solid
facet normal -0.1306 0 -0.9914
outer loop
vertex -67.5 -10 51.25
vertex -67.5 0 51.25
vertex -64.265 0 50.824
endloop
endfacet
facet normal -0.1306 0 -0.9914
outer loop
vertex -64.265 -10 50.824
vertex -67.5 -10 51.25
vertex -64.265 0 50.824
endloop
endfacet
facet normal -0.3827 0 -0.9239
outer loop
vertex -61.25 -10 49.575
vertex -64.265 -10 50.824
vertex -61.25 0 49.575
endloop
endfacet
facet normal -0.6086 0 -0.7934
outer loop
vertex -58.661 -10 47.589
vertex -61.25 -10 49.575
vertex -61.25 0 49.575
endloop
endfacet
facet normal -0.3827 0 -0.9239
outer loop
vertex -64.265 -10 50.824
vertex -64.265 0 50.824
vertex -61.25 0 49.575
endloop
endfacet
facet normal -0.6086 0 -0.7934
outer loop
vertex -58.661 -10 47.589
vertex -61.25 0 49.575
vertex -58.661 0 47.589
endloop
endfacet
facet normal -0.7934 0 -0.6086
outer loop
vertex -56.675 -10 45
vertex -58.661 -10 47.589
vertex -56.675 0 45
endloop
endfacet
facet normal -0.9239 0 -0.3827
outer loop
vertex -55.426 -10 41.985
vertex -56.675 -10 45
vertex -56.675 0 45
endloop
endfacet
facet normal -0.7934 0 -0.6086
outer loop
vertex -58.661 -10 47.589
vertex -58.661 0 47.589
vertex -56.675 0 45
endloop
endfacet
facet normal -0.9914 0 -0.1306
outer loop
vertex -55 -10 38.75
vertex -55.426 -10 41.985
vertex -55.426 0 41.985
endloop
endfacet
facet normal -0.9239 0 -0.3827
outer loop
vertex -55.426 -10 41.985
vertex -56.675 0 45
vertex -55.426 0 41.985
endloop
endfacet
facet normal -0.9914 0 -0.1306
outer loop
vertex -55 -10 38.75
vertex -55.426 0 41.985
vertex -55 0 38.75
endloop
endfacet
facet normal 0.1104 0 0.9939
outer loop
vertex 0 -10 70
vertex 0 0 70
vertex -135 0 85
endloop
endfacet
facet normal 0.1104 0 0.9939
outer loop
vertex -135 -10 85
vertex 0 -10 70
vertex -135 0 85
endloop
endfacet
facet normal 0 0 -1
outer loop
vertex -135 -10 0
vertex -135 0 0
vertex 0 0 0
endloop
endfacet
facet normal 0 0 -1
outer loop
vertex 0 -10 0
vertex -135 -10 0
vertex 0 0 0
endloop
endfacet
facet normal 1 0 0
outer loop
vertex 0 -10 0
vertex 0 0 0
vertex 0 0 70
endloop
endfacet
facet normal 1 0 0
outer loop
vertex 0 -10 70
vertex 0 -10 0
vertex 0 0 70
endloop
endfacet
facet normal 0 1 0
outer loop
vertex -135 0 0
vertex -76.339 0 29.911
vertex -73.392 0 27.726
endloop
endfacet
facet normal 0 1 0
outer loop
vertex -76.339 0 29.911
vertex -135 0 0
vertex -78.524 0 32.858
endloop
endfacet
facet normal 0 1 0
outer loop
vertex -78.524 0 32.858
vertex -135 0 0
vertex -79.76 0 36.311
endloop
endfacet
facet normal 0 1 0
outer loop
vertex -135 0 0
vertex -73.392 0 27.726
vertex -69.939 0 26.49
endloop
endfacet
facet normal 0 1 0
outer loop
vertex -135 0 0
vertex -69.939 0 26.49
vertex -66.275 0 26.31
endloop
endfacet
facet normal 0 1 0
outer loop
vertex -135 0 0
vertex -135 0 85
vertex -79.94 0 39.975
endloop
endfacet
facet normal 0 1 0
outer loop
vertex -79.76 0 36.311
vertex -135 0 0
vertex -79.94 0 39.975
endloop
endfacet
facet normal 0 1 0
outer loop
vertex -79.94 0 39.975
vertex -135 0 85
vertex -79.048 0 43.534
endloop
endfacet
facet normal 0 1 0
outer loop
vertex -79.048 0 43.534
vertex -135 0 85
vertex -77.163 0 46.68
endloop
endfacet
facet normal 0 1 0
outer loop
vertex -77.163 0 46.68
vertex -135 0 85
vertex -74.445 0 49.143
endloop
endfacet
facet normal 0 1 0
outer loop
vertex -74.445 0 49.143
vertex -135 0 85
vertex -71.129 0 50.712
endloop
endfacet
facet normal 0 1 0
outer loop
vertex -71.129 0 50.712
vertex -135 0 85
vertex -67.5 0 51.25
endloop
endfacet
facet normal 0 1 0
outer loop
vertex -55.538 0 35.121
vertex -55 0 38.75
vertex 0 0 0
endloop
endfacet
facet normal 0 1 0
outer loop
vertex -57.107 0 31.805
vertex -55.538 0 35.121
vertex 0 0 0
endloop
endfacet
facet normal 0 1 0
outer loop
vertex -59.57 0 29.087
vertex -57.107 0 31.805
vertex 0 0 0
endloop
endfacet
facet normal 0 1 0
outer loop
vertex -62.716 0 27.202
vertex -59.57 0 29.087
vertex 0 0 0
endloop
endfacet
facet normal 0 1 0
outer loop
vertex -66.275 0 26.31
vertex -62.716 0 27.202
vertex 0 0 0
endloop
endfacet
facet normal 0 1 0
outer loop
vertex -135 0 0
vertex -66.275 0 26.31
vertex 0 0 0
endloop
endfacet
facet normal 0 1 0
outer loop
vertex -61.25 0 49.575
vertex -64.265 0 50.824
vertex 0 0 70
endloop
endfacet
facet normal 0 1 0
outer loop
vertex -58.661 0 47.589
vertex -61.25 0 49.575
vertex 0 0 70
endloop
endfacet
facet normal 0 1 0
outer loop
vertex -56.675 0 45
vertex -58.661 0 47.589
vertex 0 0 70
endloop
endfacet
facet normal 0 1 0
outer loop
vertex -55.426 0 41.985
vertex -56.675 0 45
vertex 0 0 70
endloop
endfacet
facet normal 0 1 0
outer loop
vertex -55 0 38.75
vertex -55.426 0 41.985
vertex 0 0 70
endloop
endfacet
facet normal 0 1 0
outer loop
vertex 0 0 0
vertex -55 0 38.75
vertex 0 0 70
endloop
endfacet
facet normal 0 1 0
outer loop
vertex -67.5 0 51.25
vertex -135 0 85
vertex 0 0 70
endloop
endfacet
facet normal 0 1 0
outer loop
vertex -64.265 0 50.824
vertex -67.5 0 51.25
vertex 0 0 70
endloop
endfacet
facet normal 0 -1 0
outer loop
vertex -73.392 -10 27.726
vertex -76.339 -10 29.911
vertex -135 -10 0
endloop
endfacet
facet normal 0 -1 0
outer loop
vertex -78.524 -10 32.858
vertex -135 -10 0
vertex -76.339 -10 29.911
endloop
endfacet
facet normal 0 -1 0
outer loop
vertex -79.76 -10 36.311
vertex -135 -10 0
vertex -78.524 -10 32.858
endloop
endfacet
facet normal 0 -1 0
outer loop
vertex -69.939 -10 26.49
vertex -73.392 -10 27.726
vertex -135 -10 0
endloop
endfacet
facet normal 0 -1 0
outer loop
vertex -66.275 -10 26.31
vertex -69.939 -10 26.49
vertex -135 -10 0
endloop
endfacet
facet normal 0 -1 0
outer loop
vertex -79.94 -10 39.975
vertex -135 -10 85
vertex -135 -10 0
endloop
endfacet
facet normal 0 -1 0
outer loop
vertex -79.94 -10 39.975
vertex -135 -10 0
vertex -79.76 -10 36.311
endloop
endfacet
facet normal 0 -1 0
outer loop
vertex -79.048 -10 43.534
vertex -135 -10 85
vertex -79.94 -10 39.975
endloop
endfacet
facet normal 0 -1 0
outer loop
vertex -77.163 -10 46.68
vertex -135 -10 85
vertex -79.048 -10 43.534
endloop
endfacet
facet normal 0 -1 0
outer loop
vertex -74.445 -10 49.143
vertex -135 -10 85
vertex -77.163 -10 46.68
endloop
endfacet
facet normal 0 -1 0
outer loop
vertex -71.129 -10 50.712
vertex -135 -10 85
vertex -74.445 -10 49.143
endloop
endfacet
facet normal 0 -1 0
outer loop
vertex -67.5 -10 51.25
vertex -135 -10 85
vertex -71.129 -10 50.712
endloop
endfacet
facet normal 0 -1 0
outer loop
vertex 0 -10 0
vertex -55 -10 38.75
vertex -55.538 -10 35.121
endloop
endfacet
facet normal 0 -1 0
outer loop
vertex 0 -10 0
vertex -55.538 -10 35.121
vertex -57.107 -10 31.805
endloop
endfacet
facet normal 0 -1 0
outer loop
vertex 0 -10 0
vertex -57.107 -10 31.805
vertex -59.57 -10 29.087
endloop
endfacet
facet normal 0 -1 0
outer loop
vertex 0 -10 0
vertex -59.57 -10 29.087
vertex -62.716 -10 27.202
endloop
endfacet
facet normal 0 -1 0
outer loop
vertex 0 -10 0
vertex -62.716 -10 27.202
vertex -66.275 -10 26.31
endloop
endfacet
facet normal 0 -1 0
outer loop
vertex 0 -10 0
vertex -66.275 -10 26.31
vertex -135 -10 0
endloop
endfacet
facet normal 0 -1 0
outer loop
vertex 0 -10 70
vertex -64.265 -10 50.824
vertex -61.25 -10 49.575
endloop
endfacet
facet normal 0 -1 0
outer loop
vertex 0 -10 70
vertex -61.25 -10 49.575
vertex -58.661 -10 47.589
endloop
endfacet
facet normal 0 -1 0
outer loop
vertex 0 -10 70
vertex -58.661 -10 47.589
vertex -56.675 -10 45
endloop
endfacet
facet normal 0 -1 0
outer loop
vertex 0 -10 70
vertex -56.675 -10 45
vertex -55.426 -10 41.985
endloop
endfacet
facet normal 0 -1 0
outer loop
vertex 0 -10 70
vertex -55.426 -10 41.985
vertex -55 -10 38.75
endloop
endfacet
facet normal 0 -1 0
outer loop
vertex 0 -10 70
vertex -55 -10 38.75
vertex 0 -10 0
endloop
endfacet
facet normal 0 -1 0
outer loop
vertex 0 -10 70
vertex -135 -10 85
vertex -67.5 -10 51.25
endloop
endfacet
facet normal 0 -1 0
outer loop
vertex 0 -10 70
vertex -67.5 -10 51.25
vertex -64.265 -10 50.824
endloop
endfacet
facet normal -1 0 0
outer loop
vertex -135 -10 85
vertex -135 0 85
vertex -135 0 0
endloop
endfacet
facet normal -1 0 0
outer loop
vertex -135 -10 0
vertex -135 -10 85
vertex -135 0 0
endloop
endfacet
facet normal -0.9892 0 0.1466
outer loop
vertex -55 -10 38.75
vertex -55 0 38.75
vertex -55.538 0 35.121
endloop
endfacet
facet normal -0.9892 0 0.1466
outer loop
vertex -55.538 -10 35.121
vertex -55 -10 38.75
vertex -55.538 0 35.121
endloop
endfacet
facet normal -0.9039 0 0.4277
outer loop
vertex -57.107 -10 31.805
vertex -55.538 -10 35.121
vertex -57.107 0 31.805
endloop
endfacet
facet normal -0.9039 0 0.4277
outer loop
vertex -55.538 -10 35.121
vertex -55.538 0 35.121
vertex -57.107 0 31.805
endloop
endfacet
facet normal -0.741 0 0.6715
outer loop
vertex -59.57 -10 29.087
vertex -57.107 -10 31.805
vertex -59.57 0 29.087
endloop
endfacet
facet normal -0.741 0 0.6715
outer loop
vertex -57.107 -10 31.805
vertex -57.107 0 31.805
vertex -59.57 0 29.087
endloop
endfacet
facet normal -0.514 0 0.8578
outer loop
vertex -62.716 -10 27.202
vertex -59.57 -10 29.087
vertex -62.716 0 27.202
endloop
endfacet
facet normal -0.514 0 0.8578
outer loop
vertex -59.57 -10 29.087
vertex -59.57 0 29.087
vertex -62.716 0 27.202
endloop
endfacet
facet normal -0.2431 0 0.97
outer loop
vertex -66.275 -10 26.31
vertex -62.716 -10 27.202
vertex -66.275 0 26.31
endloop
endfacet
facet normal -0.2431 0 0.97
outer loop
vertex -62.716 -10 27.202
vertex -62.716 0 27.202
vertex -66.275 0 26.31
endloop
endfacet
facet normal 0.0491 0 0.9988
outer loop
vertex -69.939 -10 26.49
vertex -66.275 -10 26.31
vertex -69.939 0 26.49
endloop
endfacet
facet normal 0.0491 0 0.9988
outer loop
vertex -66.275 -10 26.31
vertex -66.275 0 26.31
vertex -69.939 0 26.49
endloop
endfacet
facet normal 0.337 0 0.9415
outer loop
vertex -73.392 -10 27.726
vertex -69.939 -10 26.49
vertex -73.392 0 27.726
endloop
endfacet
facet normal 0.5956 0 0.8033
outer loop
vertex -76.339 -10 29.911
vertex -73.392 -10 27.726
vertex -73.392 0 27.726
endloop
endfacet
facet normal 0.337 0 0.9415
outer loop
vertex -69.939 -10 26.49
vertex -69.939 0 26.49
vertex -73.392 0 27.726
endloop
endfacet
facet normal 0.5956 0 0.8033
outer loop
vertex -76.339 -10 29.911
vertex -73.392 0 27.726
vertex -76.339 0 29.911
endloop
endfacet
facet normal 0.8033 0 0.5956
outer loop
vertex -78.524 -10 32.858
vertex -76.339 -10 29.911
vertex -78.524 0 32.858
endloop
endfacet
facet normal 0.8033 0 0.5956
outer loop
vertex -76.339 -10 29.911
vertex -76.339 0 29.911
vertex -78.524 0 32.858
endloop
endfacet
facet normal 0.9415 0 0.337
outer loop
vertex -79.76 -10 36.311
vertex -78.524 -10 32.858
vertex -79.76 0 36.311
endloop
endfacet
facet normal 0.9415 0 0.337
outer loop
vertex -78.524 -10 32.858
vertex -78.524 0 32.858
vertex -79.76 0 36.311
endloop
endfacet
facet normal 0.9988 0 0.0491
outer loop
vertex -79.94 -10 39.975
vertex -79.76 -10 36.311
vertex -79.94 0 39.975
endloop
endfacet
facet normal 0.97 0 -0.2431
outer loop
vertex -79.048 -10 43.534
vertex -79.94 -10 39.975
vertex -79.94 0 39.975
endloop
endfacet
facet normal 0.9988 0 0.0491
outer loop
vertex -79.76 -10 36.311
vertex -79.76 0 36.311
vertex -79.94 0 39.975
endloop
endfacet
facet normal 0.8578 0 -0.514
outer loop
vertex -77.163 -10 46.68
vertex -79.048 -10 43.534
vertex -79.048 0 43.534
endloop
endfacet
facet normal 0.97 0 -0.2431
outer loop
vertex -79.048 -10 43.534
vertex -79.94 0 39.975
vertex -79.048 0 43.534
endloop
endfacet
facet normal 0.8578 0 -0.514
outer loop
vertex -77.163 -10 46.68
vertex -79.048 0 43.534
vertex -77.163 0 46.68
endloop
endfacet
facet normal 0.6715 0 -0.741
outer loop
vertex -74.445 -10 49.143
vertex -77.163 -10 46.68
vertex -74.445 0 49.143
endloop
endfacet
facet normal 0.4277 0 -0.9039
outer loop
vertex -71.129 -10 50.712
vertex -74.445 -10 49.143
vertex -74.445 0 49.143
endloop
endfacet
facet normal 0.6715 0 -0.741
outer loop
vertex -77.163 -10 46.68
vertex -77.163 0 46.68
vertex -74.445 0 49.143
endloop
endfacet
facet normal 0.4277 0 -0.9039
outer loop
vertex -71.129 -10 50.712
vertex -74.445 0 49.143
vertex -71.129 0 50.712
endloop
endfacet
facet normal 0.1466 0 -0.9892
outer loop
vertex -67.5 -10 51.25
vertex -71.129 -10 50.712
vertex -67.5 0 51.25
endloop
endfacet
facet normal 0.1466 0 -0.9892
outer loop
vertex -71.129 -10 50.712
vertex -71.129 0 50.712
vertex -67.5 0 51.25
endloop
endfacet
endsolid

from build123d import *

# Parameters (mm, degrees)
F1_DEPTH = 10


with BuildPart() as f1:
    # F0 (on Front) → F1 (new body)
    with BuildSketch(Plane.XZ):
        with BuildLine():
            ThreePointArc((-55, 38.75), (-58.661165, 47.588835), (-67.5, 51.25))
            ThreePointArc((-67.5, 51.25), (-76.338835, 29.911165), (-55, 38.75))
        make_face()
        Polygon((-135, 0), (0, 0), (0, 70), (-67.5, 77.5), (-135, 85), align=None)
        with BuildLine():
            ThreePointArc((-55, 38.75), (-76.338835, 29.911165), (-67.5, 51.25))
            ThreePointArc((-67.5, 51.25), (-58.661165, 47.588835), (-55, 38.75))
        make_face(mode=Mode.SUBTRACT)
    extrude(amount=F1_DEPTH)


solid = f1.part
